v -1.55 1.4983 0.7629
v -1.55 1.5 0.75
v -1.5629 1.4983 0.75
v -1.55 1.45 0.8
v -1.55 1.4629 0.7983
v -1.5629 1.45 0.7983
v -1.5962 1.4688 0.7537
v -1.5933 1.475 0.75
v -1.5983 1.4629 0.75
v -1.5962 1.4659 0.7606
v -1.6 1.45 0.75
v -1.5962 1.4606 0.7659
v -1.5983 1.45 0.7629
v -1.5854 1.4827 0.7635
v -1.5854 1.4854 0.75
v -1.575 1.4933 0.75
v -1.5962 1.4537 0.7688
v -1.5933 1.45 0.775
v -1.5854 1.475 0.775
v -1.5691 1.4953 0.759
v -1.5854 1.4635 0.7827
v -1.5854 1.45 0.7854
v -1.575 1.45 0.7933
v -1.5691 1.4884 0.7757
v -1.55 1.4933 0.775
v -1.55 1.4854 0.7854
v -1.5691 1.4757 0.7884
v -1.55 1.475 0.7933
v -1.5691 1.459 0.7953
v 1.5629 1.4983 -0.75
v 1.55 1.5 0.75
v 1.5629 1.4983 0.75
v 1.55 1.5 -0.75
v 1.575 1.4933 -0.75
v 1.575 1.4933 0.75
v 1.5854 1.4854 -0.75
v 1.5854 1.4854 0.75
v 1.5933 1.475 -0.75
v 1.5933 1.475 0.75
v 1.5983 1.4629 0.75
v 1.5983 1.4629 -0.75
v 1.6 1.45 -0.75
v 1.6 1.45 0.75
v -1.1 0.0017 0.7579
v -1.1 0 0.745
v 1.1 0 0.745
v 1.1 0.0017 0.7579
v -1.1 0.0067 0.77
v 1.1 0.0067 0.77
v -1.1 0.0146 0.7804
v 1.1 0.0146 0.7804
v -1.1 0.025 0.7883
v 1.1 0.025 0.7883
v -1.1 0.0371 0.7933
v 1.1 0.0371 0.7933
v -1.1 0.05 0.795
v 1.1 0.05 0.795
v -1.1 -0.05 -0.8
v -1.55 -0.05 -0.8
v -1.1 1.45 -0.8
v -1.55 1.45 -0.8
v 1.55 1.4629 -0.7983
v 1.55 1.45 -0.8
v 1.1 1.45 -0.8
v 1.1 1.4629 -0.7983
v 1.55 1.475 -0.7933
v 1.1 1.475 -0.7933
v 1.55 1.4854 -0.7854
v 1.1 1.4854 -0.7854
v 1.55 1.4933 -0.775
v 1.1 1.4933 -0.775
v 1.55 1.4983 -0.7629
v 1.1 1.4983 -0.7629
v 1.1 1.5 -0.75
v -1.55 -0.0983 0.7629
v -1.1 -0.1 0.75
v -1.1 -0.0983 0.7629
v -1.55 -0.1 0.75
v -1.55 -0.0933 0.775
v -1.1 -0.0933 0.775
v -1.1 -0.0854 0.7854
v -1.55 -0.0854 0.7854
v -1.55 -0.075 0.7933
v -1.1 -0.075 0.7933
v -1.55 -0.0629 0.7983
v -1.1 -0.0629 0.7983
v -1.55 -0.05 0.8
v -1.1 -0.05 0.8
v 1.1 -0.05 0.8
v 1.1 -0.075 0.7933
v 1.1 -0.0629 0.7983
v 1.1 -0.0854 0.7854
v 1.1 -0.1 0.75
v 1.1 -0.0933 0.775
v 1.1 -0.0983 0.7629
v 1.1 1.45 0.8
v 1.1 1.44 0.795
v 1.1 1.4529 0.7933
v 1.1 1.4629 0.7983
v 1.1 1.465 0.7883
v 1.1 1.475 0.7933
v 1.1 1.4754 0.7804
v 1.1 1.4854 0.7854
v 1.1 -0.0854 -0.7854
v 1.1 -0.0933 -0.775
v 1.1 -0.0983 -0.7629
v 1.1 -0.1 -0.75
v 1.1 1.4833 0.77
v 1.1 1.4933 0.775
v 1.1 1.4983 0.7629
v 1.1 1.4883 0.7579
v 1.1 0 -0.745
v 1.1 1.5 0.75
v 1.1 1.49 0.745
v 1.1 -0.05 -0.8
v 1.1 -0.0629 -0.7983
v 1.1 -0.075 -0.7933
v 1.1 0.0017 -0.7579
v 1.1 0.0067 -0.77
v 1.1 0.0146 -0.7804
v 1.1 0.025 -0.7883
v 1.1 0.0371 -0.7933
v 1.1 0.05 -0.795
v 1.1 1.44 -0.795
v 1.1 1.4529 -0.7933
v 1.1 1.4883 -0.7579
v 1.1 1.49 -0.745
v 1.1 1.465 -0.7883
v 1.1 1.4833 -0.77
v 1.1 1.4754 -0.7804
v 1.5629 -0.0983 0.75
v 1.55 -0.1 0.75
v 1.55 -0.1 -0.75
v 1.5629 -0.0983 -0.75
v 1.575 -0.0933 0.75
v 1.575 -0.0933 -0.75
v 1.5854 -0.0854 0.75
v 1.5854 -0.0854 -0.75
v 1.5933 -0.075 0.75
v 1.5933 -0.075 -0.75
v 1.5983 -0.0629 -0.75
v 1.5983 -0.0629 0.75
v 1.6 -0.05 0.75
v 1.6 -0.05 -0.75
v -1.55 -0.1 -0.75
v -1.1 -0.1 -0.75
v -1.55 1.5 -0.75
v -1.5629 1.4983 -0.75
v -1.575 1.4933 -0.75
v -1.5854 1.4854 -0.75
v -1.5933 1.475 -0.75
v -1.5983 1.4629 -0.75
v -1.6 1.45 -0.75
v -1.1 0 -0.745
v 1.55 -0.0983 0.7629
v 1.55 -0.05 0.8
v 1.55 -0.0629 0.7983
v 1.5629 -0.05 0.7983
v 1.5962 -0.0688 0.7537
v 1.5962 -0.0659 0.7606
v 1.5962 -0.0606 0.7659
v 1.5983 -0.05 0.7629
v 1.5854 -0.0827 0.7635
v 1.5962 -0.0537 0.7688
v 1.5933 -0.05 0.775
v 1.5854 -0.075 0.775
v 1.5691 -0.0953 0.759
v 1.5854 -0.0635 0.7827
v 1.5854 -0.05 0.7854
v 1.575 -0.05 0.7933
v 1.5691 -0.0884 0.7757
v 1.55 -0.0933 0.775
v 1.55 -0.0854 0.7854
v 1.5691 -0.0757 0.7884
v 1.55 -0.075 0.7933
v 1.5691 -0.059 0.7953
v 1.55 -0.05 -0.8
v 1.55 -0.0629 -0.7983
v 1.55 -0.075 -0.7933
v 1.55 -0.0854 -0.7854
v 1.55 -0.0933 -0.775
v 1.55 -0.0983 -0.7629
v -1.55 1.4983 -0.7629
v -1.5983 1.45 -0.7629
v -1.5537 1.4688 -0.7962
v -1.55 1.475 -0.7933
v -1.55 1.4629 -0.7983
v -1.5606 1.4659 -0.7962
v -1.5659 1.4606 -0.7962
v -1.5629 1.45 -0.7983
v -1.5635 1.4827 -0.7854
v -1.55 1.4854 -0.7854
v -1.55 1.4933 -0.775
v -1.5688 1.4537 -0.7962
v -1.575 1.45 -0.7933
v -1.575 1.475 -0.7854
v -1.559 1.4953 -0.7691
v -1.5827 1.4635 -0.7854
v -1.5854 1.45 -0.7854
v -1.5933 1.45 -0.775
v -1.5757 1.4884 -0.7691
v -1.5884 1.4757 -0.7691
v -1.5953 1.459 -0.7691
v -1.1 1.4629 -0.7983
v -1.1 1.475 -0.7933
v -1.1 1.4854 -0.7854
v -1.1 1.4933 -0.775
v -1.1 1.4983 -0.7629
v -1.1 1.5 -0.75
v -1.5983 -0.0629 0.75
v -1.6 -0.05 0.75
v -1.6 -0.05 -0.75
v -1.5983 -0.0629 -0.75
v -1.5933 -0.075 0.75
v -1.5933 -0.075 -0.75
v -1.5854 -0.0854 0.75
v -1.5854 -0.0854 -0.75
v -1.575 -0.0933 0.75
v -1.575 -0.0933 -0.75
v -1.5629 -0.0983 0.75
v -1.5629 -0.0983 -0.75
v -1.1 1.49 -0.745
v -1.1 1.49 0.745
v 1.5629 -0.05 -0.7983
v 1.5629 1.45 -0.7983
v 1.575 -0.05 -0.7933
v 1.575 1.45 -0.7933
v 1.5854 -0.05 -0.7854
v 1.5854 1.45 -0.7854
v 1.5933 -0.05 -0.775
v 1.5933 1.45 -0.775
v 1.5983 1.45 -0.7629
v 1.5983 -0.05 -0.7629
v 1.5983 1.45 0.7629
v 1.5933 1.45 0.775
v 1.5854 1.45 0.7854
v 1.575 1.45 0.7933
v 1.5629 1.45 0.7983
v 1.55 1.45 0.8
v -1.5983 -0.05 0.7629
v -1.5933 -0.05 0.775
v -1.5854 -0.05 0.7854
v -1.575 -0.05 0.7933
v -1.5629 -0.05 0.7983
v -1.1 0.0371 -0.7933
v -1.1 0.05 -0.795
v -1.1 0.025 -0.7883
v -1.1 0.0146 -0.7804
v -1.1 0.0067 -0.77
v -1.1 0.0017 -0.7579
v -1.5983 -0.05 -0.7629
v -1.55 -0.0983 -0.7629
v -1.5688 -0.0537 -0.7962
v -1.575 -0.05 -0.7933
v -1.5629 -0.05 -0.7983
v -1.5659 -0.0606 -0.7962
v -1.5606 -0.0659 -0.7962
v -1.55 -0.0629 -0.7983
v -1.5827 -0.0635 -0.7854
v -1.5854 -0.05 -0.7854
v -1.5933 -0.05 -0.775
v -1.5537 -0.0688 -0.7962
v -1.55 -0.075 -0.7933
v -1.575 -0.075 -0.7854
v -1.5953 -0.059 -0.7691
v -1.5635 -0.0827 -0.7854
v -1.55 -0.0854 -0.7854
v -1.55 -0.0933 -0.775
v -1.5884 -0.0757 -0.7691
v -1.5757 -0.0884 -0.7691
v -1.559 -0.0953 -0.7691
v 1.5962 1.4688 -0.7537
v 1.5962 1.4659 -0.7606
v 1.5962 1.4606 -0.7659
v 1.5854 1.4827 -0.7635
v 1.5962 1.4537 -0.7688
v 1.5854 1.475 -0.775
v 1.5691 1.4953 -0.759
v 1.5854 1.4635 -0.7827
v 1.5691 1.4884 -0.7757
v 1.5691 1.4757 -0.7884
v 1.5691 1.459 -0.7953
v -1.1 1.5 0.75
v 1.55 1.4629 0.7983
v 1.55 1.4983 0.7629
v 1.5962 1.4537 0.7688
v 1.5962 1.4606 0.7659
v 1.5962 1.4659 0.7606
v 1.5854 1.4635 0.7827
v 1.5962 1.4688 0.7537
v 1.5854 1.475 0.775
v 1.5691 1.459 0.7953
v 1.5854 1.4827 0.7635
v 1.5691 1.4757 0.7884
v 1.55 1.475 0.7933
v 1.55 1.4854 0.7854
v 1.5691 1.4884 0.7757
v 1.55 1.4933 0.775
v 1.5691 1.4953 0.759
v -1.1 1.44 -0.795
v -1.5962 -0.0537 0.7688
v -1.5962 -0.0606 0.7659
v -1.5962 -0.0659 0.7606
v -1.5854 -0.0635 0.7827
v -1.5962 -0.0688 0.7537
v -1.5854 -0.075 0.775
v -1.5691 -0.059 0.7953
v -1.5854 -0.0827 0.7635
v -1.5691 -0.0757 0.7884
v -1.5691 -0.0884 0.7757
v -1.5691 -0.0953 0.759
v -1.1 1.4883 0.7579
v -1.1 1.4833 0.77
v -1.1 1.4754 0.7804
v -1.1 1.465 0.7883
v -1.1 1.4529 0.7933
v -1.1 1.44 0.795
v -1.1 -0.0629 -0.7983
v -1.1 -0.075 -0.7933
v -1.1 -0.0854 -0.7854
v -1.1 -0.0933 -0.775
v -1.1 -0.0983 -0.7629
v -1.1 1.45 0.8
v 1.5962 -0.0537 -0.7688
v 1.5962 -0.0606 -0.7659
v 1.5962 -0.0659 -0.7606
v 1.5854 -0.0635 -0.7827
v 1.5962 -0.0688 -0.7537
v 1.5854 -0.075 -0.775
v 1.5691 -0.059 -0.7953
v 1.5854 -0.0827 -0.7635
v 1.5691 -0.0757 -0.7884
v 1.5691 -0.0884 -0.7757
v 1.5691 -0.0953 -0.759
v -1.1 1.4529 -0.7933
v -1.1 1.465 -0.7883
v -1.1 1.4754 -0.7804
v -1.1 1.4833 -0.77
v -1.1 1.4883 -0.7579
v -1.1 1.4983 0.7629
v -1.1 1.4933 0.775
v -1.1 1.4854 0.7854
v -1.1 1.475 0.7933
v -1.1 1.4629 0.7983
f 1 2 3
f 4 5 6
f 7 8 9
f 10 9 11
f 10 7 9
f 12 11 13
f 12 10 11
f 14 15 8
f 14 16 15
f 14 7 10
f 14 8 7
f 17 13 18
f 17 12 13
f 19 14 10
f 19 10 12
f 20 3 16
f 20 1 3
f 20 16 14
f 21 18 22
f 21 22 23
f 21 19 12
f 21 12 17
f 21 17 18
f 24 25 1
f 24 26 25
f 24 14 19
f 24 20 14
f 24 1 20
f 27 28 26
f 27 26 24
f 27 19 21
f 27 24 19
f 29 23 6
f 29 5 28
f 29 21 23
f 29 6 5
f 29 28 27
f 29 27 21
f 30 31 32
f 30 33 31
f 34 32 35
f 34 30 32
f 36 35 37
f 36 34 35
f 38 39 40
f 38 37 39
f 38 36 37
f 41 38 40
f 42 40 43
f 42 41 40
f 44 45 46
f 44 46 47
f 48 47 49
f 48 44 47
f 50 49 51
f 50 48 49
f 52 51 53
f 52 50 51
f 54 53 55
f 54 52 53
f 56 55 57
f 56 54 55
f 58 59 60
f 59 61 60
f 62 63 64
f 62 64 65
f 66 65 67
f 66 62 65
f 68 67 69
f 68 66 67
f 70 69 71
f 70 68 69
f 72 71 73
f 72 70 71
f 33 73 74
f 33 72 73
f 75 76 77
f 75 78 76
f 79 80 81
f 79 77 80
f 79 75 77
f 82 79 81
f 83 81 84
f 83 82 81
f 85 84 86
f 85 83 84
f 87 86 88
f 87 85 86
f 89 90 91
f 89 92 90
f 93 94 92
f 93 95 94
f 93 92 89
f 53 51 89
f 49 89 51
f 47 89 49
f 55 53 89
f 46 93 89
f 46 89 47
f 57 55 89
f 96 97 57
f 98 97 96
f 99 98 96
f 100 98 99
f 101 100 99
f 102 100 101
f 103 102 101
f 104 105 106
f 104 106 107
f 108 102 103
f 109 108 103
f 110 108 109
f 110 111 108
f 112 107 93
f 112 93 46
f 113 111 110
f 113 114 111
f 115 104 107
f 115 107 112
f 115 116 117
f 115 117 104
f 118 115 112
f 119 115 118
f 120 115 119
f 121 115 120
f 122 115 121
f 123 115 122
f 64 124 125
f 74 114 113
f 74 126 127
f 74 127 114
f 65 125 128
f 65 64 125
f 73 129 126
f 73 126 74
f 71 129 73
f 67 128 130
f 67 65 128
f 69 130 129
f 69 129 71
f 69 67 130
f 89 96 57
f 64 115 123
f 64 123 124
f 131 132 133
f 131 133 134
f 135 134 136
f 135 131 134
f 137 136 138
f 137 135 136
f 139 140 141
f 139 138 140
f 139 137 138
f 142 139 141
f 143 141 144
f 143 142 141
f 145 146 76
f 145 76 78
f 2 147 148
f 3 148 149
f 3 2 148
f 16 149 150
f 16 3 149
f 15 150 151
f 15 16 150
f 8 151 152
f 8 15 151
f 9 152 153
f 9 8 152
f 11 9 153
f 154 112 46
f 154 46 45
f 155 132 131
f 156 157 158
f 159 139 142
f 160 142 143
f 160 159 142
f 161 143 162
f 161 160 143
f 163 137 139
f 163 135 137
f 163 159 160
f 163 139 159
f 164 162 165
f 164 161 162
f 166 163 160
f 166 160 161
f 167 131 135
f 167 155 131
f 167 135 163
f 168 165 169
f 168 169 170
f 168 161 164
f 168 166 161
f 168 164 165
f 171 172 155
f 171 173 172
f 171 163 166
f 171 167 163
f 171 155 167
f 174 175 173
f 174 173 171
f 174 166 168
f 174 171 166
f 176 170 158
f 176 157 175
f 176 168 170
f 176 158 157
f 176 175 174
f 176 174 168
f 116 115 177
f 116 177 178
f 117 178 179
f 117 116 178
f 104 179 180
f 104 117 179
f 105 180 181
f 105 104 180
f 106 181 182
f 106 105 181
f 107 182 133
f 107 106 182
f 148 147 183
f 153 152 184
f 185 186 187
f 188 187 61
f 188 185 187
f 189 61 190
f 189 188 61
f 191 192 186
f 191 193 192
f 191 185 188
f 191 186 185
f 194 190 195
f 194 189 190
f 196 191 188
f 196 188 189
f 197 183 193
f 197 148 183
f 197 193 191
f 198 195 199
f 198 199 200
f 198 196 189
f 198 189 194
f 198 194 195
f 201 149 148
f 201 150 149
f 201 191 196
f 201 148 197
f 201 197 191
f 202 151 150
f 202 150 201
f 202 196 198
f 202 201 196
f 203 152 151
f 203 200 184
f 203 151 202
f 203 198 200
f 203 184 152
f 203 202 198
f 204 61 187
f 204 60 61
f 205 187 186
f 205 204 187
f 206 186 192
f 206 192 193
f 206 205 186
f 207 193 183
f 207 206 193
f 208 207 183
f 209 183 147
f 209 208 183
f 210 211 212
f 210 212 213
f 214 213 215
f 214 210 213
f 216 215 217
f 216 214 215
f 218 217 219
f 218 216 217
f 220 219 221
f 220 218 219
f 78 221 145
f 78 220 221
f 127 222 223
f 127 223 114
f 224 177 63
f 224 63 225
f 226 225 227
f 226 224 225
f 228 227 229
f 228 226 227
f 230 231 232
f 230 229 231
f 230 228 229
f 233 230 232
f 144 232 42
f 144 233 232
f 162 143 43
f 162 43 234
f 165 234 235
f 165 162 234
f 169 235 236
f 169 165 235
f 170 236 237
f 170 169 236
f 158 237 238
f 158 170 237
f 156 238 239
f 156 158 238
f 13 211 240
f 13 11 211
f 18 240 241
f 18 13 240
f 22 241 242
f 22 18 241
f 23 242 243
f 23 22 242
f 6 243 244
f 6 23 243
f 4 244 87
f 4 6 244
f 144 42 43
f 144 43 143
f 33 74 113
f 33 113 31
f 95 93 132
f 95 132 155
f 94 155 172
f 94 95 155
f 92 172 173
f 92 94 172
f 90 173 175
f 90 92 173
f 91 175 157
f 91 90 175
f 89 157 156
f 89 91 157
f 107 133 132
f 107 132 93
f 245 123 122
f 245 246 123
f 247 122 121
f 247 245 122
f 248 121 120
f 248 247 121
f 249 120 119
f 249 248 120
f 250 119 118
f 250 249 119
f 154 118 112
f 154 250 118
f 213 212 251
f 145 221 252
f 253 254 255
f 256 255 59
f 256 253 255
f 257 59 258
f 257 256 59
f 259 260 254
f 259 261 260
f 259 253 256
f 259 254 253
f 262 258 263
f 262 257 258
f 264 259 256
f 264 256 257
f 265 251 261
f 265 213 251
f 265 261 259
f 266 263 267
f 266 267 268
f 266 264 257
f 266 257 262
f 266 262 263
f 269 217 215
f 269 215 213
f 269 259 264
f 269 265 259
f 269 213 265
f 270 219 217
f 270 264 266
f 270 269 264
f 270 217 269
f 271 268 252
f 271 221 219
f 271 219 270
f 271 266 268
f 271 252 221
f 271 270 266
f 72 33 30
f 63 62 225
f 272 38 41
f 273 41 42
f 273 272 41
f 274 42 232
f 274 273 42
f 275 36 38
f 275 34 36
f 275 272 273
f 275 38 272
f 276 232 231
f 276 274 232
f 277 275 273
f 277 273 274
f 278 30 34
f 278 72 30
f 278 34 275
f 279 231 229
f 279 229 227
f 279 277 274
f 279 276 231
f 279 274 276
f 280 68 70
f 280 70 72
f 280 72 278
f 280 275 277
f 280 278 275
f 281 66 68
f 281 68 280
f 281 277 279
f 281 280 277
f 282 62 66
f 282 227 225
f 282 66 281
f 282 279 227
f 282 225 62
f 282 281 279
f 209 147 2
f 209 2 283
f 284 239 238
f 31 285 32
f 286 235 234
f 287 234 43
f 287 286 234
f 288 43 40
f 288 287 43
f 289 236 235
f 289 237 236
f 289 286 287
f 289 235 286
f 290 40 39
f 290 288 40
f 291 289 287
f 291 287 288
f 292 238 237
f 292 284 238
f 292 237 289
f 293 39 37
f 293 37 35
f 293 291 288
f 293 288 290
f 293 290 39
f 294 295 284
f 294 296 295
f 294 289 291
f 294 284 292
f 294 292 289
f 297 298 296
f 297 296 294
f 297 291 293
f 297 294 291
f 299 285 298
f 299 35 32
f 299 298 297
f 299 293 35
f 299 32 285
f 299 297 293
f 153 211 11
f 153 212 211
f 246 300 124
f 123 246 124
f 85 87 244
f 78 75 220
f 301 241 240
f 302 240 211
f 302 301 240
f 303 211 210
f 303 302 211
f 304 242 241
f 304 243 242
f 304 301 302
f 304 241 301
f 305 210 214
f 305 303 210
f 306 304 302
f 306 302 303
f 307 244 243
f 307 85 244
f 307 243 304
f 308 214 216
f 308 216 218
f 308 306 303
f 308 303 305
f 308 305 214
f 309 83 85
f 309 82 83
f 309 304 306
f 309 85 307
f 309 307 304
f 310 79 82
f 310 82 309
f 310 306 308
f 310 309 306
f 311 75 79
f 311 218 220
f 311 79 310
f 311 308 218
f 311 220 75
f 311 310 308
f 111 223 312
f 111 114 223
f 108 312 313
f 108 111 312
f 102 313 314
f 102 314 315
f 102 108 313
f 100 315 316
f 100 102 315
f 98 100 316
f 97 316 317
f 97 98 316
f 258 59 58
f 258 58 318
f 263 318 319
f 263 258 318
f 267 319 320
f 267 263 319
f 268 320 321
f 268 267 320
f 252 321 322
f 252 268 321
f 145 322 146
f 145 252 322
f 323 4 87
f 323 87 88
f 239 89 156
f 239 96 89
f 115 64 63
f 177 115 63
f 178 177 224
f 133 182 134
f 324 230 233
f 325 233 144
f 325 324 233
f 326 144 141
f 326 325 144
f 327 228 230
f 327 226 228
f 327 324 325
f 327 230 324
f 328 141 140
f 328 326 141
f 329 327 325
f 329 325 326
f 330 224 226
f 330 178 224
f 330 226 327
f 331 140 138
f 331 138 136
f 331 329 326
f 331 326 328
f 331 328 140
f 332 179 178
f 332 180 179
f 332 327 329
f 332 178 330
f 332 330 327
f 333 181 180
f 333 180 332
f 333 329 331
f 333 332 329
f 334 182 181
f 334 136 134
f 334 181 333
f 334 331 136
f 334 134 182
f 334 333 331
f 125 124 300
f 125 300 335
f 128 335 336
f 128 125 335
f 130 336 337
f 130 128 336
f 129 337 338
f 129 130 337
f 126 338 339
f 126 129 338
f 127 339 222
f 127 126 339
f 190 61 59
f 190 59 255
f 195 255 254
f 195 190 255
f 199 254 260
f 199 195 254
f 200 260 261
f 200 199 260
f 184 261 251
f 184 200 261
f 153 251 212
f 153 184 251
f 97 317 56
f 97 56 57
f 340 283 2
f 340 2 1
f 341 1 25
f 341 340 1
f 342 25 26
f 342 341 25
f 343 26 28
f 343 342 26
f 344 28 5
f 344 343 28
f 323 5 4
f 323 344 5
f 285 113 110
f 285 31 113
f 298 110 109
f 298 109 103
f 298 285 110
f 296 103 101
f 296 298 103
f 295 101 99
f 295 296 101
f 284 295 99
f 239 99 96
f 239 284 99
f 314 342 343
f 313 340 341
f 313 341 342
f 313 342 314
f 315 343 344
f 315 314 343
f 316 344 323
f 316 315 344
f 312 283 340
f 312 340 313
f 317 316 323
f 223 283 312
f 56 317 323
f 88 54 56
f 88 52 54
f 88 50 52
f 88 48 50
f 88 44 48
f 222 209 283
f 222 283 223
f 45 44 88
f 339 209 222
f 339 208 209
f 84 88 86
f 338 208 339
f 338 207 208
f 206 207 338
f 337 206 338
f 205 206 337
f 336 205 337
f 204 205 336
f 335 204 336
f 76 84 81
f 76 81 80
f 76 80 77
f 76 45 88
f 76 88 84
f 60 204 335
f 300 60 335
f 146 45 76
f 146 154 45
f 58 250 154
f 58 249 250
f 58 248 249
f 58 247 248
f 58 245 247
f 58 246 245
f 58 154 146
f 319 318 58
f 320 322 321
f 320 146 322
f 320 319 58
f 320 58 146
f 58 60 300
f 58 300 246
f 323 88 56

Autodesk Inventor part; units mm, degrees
ref_plane "YZ Plane" through (0, 0, 0) normal (1, 0, 0) x (0, 1, 0)
ref_plane "XZ Plane" through (0, 0, 0) normal (0, 1, 0) x (-1, 0, 0)
ref_plane "XY Plane" through (0, 0, 0) normal (0, 0, 1) x (1, 0, 0)
sketch "Sketch1" plane through (0, 0, 0) normal (0, 0, 1) x (1, 0, 0)
  line L0 (-1.6, 1.5) -> (-1.1, 1.5)
  line L1 (-1.1, 1.5) -> (-1.1, -0.1)
  line L2 (-1.1, -0.1) -> (-1.6, -0.1)
  line L3 (-1.6, -0.1) -> (-1.6, 1.5)
  line L4 (-1.1, 1.49) -> (1.1, 1.49)
  line L5 (1.1, 1.49) -> (1.1, 0)
  line L6 (1.1, 0) -> (-1.1, 0)
  line L7 (-1.1, 0) -> (-1.1, 1.49)
  line L8 (1.1, 1.5) -> (1.6, 1.5)
  line L9 (1.6, 1.5) -> (1.6, -0.1)
  line L10 (1.6, -0.1) -> (1.1, -0.1)
  line L11 (1.1, -0.1) -> (1.1, 1.5)
  point P0 (0, 0)
  point P1 (0, 1.49)
  point P2 (0, 0)
  dimension "d0" = 3.2
  dimension "d1" = 1.6
  dimension "d2" = 0.5
  dimension "d3" = 0.1
  dimension "d6" = 0.01
extrude "Extrusion1" add sketch "Sketch1" along normal mid plane 1.6 contours L0 L1 L2 L3 | L11 L8 L9 L10 L5
extrude "Extrusion2" add sketch "Sketch1" along normal mid plane 1.59 contours L4 L5 L6 L1
fillet "Fillet1" radius 0.05 20 edges at (0, 1.49, 0.795) (0, 0, 0.795) (0, 1.49, -0.795) (0, 0, -0.795) (-1.35, 1.5, 0.8) (-1.35, -0.1, 0.8) (1.35, -0.1, 0.8) (1.35, 1.5, 0.8) (1.35, 1.5, -0.8) (1.35, -0.1, -0.8) (1.6, 0.7, -0.8) (1.6, -0.1, 0) (1.6, 0.7, 0.8) (1.6, 1.5, 0) (-1.6, 1.5, 0) (-1.6, 0.7, 0.8) (-1.6, -0.1, 0) (-1.35, 1.5, -0.8) (-1.35, -0.1, -0.8) (-1.6, 0.7, -0.8)
properties part number "Capacitor_3216-1.6mm" material "Copper"
